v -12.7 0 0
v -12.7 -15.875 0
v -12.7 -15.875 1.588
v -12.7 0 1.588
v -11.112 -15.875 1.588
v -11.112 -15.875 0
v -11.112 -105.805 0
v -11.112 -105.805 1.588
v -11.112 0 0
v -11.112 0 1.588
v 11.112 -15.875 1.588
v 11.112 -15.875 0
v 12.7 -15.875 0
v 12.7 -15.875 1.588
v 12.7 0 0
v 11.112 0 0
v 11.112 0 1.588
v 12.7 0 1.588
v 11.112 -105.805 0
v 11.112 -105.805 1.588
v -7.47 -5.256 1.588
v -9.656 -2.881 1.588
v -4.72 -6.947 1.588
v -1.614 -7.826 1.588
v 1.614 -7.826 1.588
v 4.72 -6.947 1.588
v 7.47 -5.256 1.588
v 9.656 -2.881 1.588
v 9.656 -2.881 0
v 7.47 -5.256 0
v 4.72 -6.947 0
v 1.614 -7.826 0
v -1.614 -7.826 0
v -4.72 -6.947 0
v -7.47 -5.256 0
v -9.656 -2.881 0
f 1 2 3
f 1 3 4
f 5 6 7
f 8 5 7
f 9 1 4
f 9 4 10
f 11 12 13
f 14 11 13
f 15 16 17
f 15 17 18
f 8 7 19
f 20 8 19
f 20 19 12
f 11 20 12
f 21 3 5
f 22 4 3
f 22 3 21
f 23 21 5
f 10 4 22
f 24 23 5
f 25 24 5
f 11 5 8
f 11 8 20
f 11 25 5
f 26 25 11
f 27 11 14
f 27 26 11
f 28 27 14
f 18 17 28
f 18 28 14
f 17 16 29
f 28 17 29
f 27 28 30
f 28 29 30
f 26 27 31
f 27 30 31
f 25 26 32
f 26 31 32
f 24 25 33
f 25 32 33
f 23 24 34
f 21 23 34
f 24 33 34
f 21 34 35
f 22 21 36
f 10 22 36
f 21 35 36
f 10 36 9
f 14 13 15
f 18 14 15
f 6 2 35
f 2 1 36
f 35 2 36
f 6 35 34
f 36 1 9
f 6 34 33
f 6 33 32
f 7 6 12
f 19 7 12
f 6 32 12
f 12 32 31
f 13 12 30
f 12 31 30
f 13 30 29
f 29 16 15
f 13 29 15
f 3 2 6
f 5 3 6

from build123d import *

# Parameters (mm, degrees)
SKETCH2_W           = 1.5875
SKETCH2_H           = 15.875
BOSS_EXTRUDE1_DEPTH = 1.5875


with BuildPart() as part:
    # Sketch2 → Boss-Extrude1 (new body)
    with BuildSketch(Plane.XY):
        with BuildLine():
            ThreePointArc((11.1125, 0), (0, -7.9375), (-11.1125, 0))
            Line((-11.1125, 0), (-11.1125, -15.875))
            Line((-11.1125, -15.875), (-11.1125, -105.804584263))
            Line((-11.1125, -105.804584263), (11.1125, -105.804584263))
            Line((11.1125, -105.804584263), (11.1125, -15.875))
            Line((11.1125, -15.875), (11.1125, 0))
        make_face()
        with Locations((-11.90625, -7.9375)):
            Rectangle(SKETCH2_W, SKETCH2_H)
        with Locations((11.90625, -7.9375)):
            Rectangle(SKETCH2_W, SKETCH2_H)
    extrude(amount=BOSS_EXTRUDE1_DEPTH)


solid = part.part
